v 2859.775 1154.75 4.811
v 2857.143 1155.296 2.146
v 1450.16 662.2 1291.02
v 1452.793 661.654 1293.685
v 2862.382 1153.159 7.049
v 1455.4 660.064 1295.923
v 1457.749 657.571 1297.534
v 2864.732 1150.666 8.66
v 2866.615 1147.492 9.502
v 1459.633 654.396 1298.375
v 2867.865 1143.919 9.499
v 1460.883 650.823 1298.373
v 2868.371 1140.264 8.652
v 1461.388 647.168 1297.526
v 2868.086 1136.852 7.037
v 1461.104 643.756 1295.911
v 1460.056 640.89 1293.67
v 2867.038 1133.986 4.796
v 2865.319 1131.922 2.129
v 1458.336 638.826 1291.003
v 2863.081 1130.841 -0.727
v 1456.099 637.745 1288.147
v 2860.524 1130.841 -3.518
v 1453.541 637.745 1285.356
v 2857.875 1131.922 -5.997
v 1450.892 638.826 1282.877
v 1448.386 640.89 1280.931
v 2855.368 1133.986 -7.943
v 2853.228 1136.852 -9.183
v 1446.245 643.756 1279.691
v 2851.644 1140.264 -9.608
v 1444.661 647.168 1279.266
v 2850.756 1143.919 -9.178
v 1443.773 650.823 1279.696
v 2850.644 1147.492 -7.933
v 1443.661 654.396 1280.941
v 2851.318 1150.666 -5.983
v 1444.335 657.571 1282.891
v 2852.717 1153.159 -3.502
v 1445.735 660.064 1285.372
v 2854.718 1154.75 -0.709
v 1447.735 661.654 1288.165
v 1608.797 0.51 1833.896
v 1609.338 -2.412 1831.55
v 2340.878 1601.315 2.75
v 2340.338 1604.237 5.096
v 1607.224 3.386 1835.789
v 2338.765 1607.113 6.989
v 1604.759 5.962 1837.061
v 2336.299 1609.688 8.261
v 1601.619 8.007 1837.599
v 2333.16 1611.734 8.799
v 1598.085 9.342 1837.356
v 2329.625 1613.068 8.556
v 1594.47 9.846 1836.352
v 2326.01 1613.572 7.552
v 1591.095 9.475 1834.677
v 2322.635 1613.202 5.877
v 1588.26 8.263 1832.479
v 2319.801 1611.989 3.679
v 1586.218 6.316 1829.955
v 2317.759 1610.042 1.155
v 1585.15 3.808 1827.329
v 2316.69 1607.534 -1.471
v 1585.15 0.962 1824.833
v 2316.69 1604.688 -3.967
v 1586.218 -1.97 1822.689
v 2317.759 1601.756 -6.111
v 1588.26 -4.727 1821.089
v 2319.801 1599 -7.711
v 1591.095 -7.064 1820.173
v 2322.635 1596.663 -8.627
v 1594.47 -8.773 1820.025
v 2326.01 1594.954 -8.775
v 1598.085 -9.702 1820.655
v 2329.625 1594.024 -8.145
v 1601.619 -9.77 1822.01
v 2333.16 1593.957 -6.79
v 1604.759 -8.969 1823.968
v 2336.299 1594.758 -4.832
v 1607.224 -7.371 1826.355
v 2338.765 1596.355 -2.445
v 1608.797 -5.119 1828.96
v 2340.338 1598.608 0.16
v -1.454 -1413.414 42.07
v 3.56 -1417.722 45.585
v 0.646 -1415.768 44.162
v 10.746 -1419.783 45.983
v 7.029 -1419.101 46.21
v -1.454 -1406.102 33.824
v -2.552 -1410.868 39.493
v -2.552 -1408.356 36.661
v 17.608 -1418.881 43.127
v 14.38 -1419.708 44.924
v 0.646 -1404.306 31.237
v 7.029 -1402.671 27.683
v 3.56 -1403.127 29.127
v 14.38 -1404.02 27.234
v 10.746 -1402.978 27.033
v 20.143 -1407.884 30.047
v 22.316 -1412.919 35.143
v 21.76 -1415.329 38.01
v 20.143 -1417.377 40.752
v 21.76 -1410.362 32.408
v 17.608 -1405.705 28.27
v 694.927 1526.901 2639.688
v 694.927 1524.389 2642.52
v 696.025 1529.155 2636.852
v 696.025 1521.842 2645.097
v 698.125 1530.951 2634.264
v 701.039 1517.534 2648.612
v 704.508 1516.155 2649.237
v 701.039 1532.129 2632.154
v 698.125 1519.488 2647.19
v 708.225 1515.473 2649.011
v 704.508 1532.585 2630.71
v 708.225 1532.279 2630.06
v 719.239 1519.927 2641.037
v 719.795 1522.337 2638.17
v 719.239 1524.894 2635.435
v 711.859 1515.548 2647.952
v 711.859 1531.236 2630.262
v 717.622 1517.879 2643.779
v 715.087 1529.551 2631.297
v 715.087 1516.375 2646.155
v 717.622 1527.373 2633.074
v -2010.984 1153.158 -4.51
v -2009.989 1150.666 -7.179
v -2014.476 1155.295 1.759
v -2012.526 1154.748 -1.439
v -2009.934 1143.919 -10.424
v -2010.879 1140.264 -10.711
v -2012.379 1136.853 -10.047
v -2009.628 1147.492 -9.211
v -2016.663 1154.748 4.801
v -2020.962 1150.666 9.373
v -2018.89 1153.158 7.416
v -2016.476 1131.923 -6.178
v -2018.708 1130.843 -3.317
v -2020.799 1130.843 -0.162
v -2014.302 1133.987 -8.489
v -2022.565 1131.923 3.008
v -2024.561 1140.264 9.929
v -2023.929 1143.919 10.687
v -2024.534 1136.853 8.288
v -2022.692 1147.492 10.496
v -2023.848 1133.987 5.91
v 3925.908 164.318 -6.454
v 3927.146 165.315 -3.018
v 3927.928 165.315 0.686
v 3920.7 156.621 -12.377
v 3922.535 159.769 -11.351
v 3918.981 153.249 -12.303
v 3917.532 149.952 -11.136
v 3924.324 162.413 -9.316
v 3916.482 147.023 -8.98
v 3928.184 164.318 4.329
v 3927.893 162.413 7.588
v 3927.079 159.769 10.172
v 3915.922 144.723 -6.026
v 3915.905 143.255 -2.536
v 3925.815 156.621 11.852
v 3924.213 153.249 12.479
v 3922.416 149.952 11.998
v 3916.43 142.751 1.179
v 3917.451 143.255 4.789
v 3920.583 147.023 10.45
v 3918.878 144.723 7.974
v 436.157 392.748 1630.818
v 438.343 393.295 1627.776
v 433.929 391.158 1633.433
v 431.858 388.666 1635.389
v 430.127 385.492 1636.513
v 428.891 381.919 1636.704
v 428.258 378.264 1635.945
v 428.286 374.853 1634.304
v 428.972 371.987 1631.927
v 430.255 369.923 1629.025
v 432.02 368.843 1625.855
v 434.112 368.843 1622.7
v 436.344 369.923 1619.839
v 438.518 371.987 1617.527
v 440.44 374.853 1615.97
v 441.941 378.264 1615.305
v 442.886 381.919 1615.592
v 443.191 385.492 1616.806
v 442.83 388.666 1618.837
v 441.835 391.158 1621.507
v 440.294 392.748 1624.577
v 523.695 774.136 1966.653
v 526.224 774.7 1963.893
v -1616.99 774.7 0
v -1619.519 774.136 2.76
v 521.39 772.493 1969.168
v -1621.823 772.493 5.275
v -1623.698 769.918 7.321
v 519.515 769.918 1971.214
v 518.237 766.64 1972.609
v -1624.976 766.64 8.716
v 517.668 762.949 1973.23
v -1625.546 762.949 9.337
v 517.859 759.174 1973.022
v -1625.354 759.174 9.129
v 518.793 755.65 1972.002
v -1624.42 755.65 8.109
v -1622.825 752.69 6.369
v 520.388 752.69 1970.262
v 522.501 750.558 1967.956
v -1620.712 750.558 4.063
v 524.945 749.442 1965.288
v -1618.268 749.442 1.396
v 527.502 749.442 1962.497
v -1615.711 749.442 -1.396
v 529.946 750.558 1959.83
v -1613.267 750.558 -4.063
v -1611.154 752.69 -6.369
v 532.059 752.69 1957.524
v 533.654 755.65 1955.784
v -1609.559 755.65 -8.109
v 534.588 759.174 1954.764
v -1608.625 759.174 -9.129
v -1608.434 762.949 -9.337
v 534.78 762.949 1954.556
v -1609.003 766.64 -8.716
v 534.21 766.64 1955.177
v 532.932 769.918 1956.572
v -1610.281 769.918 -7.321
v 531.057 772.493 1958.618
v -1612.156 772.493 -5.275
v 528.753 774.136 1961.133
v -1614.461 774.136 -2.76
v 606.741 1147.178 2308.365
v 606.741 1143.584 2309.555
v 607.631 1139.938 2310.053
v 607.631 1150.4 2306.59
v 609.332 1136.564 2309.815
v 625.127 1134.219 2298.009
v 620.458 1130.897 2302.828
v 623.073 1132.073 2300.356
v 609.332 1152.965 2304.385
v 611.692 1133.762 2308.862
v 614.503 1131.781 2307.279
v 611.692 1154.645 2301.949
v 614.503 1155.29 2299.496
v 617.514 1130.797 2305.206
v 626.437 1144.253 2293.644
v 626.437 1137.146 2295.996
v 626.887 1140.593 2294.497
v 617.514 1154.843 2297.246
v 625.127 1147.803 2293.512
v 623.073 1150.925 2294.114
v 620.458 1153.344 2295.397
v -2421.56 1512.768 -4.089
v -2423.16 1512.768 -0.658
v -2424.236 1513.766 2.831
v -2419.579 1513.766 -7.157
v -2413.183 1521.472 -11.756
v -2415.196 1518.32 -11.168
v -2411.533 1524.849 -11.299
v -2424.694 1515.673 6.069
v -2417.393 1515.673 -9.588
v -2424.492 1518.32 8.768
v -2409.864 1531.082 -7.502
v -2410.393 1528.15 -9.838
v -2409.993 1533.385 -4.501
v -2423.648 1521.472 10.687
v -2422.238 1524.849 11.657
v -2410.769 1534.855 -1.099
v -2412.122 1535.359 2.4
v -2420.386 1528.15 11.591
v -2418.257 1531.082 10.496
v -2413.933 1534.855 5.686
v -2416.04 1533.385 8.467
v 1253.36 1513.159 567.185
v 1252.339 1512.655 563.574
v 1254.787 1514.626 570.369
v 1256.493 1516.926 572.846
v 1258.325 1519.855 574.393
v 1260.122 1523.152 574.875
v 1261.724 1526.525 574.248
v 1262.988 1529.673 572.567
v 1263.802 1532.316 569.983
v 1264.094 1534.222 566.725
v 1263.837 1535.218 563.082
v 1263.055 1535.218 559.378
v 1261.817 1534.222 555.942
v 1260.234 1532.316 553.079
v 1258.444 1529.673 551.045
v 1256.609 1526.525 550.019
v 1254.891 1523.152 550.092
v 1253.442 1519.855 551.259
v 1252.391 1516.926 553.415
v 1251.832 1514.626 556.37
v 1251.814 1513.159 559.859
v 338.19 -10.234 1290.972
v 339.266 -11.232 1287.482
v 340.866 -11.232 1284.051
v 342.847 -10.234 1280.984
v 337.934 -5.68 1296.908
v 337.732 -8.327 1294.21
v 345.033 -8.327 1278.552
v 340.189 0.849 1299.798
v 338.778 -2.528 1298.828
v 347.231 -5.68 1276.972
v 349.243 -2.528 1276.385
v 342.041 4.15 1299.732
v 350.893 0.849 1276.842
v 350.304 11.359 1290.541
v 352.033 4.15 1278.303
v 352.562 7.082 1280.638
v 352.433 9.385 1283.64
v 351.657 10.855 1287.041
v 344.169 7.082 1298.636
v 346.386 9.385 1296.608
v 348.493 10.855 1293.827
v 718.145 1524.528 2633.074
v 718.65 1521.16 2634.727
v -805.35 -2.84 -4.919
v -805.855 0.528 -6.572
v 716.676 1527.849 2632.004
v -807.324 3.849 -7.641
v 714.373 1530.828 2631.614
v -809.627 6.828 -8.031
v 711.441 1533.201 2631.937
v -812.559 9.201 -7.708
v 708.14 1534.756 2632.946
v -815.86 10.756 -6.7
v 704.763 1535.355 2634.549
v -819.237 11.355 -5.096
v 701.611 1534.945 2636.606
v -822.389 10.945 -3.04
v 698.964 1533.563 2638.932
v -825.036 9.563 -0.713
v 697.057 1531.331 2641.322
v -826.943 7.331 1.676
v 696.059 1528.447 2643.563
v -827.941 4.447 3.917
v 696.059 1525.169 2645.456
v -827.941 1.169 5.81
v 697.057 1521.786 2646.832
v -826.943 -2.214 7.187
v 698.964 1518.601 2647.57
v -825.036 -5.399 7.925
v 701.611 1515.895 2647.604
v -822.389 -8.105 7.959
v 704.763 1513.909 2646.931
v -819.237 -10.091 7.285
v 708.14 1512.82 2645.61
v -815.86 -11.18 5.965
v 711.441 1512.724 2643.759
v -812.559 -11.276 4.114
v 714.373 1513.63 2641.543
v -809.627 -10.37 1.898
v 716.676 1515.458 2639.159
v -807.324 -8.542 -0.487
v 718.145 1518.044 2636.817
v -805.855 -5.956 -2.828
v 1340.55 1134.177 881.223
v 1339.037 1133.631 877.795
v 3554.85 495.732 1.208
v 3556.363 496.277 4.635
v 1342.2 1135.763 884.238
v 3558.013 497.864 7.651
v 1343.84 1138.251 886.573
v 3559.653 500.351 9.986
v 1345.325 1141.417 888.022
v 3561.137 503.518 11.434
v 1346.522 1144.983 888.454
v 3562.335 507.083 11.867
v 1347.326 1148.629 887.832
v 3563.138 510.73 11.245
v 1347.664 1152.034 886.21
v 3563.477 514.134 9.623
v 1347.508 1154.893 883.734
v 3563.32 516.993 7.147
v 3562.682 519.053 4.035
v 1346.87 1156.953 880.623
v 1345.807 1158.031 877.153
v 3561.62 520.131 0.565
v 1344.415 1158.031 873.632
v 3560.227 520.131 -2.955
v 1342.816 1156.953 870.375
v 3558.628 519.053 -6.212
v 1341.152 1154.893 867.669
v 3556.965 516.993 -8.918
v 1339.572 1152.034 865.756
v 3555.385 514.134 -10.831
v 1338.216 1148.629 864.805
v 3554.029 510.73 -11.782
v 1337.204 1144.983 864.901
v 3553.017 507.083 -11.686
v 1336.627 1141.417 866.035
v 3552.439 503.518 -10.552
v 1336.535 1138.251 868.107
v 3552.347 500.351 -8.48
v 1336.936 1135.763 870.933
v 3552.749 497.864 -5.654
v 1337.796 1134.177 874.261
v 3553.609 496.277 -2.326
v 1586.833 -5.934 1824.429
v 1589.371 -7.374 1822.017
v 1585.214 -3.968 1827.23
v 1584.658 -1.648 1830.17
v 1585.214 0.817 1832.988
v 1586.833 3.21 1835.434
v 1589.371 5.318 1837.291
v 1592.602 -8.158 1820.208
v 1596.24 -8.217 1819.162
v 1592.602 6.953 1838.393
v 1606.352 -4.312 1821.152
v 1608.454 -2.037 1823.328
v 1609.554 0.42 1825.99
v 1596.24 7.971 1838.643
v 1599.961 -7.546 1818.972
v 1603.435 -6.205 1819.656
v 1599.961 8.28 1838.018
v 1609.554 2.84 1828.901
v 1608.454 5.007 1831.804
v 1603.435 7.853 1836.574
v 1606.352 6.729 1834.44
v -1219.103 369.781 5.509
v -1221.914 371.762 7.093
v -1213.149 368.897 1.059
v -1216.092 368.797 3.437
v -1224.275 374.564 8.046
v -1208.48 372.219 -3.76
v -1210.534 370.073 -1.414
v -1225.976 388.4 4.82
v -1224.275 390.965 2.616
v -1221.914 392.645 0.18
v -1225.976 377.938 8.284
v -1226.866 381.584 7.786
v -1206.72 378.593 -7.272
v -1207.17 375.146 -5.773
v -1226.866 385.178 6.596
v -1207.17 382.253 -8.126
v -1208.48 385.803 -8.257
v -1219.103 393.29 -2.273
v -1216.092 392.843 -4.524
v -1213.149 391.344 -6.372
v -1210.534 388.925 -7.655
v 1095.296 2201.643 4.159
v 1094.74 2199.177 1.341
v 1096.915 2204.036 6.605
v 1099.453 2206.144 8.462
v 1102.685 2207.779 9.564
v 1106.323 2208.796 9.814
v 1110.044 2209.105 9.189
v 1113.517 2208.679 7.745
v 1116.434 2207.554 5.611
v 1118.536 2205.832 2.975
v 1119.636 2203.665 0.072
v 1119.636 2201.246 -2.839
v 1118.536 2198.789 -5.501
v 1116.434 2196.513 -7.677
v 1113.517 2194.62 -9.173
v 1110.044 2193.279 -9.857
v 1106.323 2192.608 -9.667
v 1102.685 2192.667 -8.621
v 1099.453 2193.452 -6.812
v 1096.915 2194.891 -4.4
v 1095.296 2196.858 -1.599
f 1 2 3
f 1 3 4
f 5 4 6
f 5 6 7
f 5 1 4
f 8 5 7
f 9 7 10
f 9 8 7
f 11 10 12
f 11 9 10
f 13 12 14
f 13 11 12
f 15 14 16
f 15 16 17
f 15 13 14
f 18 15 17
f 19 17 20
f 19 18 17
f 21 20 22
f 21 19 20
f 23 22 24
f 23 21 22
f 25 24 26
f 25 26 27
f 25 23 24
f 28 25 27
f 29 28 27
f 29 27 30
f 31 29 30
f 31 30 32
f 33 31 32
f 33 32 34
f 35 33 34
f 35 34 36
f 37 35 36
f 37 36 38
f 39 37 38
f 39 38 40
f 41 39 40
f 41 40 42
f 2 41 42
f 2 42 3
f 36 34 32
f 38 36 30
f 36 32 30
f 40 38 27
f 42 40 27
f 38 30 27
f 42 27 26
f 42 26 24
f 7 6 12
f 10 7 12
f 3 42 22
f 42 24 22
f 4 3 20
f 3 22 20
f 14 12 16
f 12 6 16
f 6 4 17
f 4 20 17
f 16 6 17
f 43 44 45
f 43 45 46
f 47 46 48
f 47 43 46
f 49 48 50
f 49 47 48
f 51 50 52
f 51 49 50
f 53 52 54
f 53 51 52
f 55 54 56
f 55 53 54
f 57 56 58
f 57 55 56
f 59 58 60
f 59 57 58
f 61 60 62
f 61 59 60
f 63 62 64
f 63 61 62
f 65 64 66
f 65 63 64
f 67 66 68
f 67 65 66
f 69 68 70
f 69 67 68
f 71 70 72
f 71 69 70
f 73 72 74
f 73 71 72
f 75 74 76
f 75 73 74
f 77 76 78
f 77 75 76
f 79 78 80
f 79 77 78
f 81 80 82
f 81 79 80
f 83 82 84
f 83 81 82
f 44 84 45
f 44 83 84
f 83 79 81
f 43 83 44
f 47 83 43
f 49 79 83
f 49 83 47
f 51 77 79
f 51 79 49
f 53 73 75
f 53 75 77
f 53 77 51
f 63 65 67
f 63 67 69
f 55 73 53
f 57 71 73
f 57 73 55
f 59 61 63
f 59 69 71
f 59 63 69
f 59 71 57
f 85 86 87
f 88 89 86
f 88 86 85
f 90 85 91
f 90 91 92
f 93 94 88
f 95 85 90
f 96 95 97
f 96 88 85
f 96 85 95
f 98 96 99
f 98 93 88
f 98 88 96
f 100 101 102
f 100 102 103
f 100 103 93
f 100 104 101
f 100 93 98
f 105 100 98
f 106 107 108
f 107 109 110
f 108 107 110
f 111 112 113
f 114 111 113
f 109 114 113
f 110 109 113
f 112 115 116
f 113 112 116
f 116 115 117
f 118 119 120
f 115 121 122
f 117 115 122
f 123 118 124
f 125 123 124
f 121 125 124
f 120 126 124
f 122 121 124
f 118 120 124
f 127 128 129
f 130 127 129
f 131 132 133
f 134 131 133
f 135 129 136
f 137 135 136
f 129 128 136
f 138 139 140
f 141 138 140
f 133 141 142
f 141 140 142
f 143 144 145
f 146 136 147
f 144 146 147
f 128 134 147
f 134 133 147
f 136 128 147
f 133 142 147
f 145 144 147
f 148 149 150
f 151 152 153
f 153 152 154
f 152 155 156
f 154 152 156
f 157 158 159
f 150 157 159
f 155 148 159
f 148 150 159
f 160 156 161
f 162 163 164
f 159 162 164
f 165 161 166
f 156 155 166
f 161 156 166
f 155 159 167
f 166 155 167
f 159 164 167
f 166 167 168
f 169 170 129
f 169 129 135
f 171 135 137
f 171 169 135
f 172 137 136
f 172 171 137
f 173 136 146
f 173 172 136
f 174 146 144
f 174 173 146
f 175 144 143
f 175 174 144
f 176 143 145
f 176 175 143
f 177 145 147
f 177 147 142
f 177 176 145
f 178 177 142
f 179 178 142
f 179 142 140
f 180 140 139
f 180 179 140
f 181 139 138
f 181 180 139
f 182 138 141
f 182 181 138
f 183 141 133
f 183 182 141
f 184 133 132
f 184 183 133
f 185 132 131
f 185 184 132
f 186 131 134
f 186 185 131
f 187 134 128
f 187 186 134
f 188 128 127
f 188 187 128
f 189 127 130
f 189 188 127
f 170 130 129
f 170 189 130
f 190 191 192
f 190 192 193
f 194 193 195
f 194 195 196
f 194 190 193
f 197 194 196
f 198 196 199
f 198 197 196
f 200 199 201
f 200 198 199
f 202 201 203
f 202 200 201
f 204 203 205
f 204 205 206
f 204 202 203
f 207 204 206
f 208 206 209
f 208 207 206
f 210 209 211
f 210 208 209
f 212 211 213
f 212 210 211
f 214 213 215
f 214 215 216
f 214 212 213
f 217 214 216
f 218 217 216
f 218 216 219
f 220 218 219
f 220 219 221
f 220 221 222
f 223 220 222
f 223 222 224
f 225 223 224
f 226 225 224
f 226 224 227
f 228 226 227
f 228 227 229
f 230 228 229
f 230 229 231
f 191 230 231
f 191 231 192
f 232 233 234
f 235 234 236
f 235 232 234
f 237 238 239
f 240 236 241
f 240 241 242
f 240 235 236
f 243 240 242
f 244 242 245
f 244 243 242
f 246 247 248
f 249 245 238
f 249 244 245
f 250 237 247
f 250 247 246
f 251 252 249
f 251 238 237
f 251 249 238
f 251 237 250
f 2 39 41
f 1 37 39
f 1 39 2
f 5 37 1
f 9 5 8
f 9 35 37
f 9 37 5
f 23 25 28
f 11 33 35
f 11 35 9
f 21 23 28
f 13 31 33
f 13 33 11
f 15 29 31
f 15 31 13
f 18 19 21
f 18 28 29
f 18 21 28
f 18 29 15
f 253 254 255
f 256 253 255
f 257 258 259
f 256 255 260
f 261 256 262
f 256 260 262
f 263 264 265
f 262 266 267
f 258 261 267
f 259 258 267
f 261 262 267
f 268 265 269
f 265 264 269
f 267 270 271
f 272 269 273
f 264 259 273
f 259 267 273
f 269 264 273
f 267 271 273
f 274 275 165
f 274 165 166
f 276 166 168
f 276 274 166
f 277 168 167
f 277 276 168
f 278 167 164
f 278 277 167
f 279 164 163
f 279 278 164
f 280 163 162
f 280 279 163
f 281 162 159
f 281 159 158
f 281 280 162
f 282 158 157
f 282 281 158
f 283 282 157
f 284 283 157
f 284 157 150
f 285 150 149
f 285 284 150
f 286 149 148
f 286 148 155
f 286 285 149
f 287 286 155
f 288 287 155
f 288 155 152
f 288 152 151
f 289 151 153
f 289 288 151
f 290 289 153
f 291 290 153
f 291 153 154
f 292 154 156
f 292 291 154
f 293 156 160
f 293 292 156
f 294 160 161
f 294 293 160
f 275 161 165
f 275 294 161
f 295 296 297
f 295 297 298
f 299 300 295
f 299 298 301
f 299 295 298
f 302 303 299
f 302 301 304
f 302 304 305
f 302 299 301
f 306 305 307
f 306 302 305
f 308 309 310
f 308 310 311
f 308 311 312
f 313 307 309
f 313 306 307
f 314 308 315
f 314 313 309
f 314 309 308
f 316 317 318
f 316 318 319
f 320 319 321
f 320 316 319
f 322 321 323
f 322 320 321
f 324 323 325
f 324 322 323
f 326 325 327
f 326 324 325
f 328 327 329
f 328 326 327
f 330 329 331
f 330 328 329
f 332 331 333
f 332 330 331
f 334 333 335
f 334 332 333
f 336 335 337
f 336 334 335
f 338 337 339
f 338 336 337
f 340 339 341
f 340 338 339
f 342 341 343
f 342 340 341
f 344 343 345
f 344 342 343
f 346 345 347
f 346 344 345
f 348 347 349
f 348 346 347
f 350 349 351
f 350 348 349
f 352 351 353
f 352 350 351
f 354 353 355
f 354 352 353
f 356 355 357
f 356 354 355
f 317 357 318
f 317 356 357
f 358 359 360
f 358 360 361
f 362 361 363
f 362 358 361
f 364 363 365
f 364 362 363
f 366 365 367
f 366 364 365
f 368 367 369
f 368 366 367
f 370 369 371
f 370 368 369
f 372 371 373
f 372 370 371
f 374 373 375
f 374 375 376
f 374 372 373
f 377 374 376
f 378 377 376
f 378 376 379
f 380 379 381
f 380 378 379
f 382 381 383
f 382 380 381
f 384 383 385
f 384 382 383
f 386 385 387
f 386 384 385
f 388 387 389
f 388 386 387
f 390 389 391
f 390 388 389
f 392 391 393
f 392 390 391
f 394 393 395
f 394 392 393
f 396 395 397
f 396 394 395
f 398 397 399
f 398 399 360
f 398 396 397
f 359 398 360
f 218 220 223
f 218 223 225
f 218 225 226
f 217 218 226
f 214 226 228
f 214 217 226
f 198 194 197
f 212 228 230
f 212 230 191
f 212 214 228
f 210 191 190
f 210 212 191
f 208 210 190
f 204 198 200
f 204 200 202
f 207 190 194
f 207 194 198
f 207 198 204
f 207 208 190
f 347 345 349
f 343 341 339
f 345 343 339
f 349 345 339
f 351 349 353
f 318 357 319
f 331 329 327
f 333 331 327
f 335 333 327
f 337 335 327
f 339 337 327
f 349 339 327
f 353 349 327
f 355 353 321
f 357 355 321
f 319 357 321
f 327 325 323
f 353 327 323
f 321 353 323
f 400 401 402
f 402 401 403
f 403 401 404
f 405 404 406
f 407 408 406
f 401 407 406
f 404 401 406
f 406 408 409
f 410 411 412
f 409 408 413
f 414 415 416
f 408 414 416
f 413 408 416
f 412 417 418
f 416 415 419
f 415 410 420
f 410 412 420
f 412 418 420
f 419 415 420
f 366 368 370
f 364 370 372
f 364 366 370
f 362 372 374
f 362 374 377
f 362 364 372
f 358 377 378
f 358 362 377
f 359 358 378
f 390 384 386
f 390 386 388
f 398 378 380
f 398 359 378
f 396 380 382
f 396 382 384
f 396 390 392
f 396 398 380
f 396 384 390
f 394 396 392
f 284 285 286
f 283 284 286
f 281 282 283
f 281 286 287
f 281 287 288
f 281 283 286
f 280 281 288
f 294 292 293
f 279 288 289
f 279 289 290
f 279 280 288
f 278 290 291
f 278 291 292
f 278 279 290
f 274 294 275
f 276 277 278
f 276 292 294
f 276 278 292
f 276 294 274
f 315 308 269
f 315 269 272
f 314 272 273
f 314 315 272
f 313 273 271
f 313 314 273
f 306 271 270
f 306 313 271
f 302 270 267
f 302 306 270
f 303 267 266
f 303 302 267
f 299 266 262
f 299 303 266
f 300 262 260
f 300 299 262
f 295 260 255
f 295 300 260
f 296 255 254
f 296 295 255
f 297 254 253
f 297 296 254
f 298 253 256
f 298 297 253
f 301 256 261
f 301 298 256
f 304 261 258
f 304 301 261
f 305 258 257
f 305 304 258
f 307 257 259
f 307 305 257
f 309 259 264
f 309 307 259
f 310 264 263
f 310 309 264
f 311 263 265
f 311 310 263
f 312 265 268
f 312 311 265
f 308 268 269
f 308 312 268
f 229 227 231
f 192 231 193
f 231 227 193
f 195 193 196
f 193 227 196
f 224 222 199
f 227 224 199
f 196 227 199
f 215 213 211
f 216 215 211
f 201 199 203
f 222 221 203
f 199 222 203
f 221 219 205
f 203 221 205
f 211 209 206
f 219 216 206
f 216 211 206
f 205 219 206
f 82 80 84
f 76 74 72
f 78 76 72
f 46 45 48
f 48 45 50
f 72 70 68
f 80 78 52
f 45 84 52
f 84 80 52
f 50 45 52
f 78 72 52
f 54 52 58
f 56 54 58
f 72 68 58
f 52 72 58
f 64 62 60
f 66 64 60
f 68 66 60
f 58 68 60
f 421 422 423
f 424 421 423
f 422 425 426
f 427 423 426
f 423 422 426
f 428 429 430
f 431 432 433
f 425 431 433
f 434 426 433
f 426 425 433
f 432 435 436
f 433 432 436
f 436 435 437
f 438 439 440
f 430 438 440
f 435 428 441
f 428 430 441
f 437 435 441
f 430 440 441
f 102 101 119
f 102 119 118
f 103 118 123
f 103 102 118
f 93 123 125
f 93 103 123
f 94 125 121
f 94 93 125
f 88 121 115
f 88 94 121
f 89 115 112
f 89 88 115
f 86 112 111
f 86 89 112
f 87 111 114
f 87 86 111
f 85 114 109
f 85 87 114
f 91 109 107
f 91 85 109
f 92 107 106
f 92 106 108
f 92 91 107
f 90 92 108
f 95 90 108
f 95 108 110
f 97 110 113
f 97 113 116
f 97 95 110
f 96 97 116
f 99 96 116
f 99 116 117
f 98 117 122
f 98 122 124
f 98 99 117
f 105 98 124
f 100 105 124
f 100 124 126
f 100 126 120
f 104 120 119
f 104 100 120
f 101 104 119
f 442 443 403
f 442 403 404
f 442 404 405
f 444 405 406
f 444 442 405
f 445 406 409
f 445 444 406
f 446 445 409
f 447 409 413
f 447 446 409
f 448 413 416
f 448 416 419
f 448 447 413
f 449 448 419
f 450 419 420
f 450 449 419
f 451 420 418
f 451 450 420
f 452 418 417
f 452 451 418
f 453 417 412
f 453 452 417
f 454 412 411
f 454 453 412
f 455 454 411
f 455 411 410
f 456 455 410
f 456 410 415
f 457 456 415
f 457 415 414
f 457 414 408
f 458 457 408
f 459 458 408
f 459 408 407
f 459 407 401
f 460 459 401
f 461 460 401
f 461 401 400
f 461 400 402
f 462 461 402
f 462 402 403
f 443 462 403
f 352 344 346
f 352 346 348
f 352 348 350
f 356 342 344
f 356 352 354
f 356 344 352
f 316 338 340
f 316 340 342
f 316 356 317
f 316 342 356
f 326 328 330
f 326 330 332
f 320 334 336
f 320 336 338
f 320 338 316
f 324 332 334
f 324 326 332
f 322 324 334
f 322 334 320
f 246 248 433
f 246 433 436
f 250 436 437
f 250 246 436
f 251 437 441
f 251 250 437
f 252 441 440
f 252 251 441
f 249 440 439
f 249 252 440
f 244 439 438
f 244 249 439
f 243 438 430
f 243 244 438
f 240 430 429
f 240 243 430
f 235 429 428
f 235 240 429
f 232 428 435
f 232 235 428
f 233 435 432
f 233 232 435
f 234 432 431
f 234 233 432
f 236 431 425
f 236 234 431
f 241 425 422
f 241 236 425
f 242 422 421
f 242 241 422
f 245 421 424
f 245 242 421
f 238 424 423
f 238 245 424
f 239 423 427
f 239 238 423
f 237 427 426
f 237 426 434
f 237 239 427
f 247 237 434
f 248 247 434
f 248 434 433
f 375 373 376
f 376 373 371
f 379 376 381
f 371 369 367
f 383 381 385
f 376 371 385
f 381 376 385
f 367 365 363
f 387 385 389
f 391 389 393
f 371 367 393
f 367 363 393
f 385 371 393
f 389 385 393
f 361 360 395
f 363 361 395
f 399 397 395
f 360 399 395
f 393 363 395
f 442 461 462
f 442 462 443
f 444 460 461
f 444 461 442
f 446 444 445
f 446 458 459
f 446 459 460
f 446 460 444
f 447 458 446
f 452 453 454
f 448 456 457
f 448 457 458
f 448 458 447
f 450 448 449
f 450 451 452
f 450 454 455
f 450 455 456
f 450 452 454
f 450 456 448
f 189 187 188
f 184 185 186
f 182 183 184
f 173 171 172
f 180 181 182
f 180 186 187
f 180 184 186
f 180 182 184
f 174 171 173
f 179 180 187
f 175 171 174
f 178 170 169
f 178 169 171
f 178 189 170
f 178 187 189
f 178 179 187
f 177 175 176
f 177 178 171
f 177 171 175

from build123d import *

# Parameters (mm, degrees)
F63_R = 12.7
F70_R = 12.7
F73_R = 12.7
F76_R = 12.7
F79_R = 12.7
F82_R = 12.7
F85_R = 12.7
F88_R = 12.7
F91_R = 12.7
F94_R = 12.7
F97_R = 12.7


with BuildPart() as f64:
    # F64: sweep along a path in F25
    with BuildLine(Plane(origin=(-389.3408093806, -284.2837312739, 424.8909350903), x_dir=(0.7955538849, -0.3369223213, 0.5035646589), z_dir=(0.6058828404, 0.4423955322, -0.6612050944))) as f64_path:
        Line((1378.450525737, -2734.5022761695), (501.7292301637, 1152.5681725711))
    # F63 (on line) → F64 (sweep)
    with BuildSketch(Plane(origin=(520.001502018, 2188.3635168782, 1940.6720255435), x_dir=(0.9845615706, -0.1309603061, -0.1161374701), z_dir=(-0.1750386065, -0.7366288346, -0.6532529726))):
        with Locations((190.2261524825, 963.7603534071)):
            Circle(F63_R)
    sweep(path=f64_path.line)


with BuildPart() as f71:
    # F71: sweep along a path in F13
    with BuildLine(Plane(origin=(-431.7393863669, 0, 925.8681019204), x_dir=(0.906307787, 0, 0.4226182617), z_dir=(0.4226182617, 0, -0.906307787))) as f71_path:
        Line((-2190.7905685546, -1524), (857.2094314454, 0))
    # F70 (on line) → F71 (sweep)
    with BuildSketch(Plane(origin=(621.5164662722, -342.8837725782, 289.8178878922), x_dir=(0.4053131641, 0.894427191, 0.1890006324), z_dir=(0.8106263281, -0.4472135955, 0.3780012647))):
        with Locations((383.3557119332, 1021.5824195307)):
            Circle(F70_R)
    sweep(path=f71_path.line)


with BuildPart() as f74:
    # F74: sweep along a path in F21
    with BuildLine(Plane(origin=(-615.8191529715, 0, 928.9531192667), x_dir=(0.8334897919, 0, 0.5525348557), z_dir=(0.5525348557, 0, -0.8334897919))) as f74_path:
        Line((-1681.2570460077, -1143), (1261.5739579109, -381))
    # F73 (on line) → F74 (sweep)
    with BuildSketch(Plane(origin=(908.3779208917, -282.1993005073, 602.1794967039), x_dir=(0.2089287283, 0.9680732664, 0.1385024818), z_dir=(0.8068791854, -0.2506674111, 0.5348942225))):
        with Locations((685.0713923805, 1114.5344889064)):
            Circle(F73_R)
    sweep(path=f74_path.line)


with BuildPart() as f77:
    # F77: sweep along a path in F15
    with BuildLine(Plane.XZ.offset(-762)) as f77_path:
        Line((-1616.9895384722, 0), (526.2235289716, 1963.8929462603))
    # F76 (on line) → F77 (sweep)
    with BuildSketch(Plane(origin=(1264.2533360874, 0, 1158.4747437124), x_dir=(0, 1, 0), z_dir=(0.7372773368, 0, 0.6755902076))):
        with Locations((762, 1092.4222980088)):
            Circle(F76_R)
    sweep(path=f77_path.line)


with BuildPart() as f80:
    # F80: sweep along a path in F23
    with BuildLine(Plane(origin=(-744.440015029, 0, 593.0264782161), x_dir=(0, -1, 0), z_dir=(-0.7821615259, 0, 0.6230757156))) as f80_path:
        Line((-381, -758.1892723911), (-1143, 2184.6417315276))
    # F79 (on line) → F80 (sweep)
    with BuildSketch(Plane(origin=(1448.487203882, 601.9542519396, 1818.3198818893), x_dir=(0.7976028692, -0.1895659013, -0.5726206703), z_dir=(0.6031829432, 0.2506674111, 0.7571896632))):
        with Locations((-1042.7871322125, 361.6953659558)):
            Circle(F79_R)
    sweep(path=f80_path.line)


with BuildPart() as f83:
    # F83: sweep along a path in F11
    with BuildLine(Plane(origin=(-612.5318538975, 0, 353.645430735), x_dir=(0, 1, 0), z_dir=(0.8660254038, 0, -0.5))) as f83_path:
        Line((0, -408.354569265), (1524, 2639.645430735))
    # F82 (on line) → F83 (sweep)
    with BuildSketch(Plane(origin=(1360.658172294, 1360.658172294, 2356.729086147), x_dir=(0.894427191, -0.2236067977, -0.3872983346), z_dir=(0.4472135955, 0.4472135955, 0.7745966692))):
        with Locations((-730.4868606394, 0)):
            Circle(F82_R)
    sweep(path=f83_path.line)


with BuildPart() as f86:
    # F86: sweep along a path in F66
    with BuildLine(Plane(origin=(1357.2791237126, 178.7256412325, -148.5163809982), x_dir=(-0.1290207409, 0.9915413951, 0.0141177251), z_dir=(0.9856582095, 0.1297908385, -0.1078528267))) as f86_path:
        Line((-180.2503073613, 1991.6784779044), (2039.3497725054, 120.4109458824))
    # F85 (on line) → F86 (sweep)
    with BuildSketch(Plane(origin=(239.8966595299, -1077.6722828153, 895.5177681397), x_dir=(-0.9856582095, -0.1297908385, 0.1078528267), z_dir=(-0.1687539451, 0.7580824578, -0.6299468971))):
        with Locations((-1377.0281732502, 1406.5536972315)):
            Circle(F85_R)
    sweep(path=f86_path.line)


with BuildPart() as f89:
    # F89: sweep along a path in F43
    with BuildLine(Plane(origin=(1322.085267977, -603.0697452142, 0), x_dir=(-0.4150127603, -0.9098155905, 0), z_dir=(-0.9098155905, 0.4150127603, 0))) as f89_path:
        Line((-2425.5424502575, 0), (-662.8483304511, 1828.8))
    # F88 (on line) → F89 (sweep)
    with BuildSketch(Plane(origin=(-246.7470301008, -540.9334757748, 616.8502447343), x_dir=(0.9576279754, -0.1898910422, 0.2165411111), z_dir=(-0.2880080914, -0.6313884219, 0.72))):
        with Locations((1925.5105956571, 1205.7742417561)):
            Circle(F88_R)
    sweep(path=f89_path.line)


with BuildPart() as f92:
    # F92: sweep along a path in F61
    with BuildLine(Plane(origin=(-43.9645667407, 125.4469535881, 0), x_dir=(-0.9437219156, -0.3307399977, 0), z_dir=(-0.3307399977, 0.9437219156, 0))) as f92_path:
        Line((-1585.7082149983, 1288.8739248976), (-3076.5950700847, 0))
    # F91 (on line) → F92 (sweep)
    with BuildSketch(Plane(origin=(254.635764715, 89.2405176226, -233.2604523847), x_dir=(-0.1844954764, 0.9681930038, 0.1690080667), z_dir=(0.7139248385, 0.2502045312, -0.6539946617))):
        with Locations((579.0824403399, 1931.5243215329)):
            Circle(F91_R)
    sweep(path=f92_path.line)


with BuildPart() as f95:
    # F95: sweep along a path in F68
    with BuildLine(Plane(origin=(407.35623983, 1414.9958187026, 0), x_dir=(0.960970966, -0.276649241, 0), z_dir=(-0.276649241, -0.960970966, 0))) as f95_path:
        Line((3278.5046341406, 0), (972.6985592843, 876.5871802043))
    # F94 (on line) → F95 (sweep)
    with BuildSketch(Plane(origin=(536.8980086444, -154.5649471771, -212.3996822224), x_dir=(-0.2404602271, -0.9659863713, 0.0951273333), z_dir=(-0.8982506037, 0.2585929821, 0.3553526735))):
        with Locations((-1346.2554817405, 1308.8287141944)):
            Circle(F94_R)
    sweep(path=f95_path.line)


with BuildPart() as f98:
    # F98: sweep along a path in F40
    with BuildLine(Plane(origin=(882.8350421028, 1716.8745773649, 0), x_dir=(0.8893149829, -0.4572951576, 0), z_dir=(-0.4572951576, -0.8893149829, 0))) as f98_path:
        Line((3417.4387166019, 0), (421.7726214012, 562.3954534531))
    # F97 (on line) → F98 (sweep)
    with BuildSketch(Plane(origin=(271.619766491, -139.669752903, -57.3395340169), x_dir=(-0.4397516593, -0.893308791, 0.0928325488), z_dir=(-0.8740455191, 0.449443438, 0.184512944))):
        with Locations((-1862.3680520254, 810.0921524147)):
            Circle(F97_R)
    sweep(path=f98_path.line)


solid = Compound([f64.part, f71.part, f74.part, f77.part, f80.part, f83.part, f86.part, f89.part, f92.part, f95.part, f98.part])
